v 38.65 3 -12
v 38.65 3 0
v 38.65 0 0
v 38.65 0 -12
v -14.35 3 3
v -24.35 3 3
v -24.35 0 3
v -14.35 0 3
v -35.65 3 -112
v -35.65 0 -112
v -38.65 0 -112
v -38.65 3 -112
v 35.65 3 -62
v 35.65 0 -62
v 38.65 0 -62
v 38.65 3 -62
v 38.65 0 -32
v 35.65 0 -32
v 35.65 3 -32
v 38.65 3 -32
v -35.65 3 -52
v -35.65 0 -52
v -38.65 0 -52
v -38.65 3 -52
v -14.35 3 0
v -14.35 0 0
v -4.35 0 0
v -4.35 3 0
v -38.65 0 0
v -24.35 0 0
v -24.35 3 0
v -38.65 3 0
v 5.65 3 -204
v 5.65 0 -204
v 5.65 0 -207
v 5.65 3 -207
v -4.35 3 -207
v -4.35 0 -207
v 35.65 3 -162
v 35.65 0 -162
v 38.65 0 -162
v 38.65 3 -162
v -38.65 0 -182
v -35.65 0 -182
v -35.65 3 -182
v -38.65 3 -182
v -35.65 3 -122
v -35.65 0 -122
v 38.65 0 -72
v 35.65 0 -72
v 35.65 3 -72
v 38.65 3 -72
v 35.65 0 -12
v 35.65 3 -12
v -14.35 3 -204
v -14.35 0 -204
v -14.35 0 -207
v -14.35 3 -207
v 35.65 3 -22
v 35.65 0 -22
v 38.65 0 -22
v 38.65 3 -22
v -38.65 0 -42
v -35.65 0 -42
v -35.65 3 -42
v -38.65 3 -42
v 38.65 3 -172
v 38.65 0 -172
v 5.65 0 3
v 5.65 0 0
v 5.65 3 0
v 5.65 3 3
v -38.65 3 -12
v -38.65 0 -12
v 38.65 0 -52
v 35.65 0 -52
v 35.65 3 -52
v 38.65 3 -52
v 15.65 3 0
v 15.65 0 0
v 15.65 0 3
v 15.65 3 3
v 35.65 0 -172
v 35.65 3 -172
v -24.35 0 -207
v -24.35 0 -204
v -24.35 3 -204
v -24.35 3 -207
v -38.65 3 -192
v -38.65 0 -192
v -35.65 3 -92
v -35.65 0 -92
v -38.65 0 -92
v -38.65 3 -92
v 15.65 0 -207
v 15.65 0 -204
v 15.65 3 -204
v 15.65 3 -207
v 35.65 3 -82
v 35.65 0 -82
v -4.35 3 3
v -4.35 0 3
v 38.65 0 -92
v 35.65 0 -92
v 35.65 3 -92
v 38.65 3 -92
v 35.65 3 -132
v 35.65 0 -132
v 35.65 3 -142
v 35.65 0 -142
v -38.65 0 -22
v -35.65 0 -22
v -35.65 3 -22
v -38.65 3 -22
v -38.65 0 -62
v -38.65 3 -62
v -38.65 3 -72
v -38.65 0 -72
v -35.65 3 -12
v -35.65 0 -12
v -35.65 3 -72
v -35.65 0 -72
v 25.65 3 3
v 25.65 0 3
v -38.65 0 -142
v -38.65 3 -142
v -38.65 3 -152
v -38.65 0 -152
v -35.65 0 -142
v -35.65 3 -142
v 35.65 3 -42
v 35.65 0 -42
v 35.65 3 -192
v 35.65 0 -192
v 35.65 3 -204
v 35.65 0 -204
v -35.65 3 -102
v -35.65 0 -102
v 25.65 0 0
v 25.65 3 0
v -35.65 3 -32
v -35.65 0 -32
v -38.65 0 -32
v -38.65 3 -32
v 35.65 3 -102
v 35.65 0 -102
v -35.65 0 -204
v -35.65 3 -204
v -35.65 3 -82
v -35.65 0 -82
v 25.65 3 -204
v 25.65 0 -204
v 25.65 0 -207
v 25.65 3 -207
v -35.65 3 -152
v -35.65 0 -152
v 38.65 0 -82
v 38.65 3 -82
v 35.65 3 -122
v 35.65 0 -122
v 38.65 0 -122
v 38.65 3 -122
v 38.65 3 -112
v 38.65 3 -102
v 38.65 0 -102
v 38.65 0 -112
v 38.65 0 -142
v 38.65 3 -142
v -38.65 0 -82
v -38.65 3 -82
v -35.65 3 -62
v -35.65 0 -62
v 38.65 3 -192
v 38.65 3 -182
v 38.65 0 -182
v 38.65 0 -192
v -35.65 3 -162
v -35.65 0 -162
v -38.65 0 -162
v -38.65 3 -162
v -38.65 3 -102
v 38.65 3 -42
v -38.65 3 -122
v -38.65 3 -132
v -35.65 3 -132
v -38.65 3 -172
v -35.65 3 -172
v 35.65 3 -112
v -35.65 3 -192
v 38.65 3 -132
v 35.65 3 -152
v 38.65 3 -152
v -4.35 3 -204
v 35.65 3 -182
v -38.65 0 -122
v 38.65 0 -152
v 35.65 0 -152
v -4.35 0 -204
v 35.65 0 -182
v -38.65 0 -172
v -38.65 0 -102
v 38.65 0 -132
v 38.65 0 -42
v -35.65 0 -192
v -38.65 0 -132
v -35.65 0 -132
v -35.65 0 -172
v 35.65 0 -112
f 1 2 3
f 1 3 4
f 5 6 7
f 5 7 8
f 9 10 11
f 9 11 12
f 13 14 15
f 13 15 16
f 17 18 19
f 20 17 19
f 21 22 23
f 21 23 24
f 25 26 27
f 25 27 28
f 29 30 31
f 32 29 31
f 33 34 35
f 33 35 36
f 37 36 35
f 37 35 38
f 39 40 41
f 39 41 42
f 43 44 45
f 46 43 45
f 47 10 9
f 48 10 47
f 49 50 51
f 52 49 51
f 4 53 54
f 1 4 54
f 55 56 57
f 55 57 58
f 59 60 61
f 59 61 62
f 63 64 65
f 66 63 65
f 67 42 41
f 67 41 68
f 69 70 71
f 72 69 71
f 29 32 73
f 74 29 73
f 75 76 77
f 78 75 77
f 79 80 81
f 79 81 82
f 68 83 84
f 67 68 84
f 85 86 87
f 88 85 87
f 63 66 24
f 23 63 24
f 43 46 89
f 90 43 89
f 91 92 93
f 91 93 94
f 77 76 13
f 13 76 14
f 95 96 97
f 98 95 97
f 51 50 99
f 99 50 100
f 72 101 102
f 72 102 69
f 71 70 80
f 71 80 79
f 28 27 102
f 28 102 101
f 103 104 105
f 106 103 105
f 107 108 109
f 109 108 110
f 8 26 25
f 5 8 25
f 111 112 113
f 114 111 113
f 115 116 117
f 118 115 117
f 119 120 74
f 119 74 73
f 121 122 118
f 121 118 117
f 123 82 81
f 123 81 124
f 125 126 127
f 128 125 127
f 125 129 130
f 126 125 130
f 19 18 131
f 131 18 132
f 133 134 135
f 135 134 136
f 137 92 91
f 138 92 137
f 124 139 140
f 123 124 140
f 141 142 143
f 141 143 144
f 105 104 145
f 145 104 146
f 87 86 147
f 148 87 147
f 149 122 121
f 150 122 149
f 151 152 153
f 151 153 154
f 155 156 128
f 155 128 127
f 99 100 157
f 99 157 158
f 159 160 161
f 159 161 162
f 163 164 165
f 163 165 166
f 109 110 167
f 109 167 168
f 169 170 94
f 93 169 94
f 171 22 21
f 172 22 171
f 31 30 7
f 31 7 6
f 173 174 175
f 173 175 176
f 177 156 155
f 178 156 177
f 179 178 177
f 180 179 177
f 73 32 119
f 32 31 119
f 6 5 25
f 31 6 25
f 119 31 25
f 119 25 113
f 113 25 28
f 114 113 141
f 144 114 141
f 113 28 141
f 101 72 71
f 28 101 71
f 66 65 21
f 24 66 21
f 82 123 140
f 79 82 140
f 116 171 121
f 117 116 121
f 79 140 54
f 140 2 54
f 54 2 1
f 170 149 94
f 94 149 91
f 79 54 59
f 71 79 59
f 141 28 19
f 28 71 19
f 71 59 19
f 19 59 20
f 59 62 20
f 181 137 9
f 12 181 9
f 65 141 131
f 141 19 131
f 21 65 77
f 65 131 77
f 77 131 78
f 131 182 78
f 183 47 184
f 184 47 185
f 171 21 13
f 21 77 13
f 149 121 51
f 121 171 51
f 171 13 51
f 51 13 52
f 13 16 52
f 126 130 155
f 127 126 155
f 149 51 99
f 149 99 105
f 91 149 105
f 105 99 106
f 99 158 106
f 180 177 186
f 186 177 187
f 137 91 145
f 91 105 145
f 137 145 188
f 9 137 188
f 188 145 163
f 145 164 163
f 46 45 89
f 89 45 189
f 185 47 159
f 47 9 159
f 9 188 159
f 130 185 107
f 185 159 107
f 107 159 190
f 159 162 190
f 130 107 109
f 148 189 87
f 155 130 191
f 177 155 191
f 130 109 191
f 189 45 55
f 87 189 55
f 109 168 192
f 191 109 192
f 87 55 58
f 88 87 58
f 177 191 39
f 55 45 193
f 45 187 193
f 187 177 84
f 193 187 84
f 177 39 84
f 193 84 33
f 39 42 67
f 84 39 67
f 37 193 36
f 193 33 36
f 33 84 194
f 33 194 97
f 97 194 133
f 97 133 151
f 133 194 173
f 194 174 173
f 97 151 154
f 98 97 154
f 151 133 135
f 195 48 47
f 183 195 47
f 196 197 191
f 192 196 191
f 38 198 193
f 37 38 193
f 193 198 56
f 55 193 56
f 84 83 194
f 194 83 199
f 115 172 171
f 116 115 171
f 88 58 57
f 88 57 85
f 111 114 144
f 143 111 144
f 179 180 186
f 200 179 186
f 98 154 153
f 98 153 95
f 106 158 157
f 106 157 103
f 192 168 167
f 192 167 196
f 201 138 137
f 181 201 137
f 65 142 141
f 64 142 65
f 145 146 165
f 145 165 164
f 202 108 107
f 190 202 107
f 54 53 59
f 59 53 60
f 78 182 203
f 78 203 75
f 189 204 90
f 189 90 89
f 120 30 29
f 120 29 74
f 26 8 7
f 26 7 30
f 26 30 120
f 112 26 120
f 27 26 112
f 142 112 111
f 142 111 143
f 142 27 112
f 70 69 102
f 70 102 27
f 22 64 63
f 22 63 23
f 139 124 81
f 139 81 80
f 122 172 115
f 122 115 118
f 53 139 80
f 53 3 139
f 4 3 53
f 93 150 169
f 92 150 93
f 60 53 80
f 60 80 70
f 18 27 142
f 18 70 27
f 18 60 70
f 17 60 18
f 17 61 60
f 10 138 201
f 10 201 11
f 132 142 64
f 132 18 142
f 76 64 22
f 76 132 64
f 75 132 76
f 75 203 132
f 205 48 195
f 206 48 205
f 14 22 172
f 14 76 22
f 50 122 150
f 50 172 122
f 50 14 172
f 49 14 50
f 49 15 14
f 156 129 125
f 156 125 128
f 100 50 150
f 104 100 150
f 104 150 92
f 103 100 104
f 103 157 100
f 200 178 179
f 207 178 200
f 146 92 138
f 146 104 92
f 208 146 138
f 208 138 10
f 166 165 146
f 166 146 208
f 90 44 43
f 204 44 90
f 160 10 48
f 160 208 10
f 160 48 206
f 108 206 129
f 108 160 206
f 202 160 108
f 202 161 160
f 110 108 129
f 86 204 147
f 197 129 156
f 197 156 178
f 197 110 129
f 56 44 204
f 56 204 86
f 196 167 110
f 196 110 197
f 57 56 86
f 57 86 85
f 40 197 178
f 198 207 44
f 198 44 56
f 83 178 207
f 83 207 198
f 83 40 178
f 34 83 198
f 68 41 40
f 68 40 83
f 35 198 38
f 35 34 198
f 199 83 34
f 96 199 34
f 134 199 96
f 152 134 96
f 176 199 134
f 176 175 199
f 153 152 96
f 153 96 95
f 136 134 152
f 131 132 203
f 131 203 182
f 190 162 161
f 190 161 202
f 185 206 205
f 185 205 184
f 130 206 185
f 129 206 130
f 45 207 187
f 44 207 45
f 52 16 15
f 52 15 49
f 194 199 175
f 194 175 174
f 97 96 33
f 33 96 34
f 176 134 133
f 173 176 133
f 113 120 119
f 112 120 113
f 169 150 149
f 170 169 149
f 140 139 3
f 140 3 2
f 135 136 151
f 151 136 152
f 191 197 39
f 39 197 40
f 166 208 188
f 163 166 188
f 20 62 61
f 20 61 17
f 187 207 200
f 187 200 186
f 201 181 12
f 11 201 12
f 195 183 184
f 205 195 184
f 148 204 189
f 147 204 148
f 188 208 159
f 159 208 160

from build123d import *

# Parameters (mm, degrees)
SKETCH1_W           = 35.65
SKETCH1_H           = 204
BOSS_EXTRUDE1_DEPTH = 3
SKETCH2_W           = 12
SKETCH2_H           = 3
SKETCH2_W_2         = 10
BOSS_EXTRUDE2_DEPTH = 3
ESQUISSE1_W         = 10
ESQUISSE1_H         = 3
BOSS_EXTRU_1_DEPTH  = 3
ESQUISSE2_W         = 10
ESQUISSE2_H         = 3
BOSS_EXTRU_2_DEPTH  = 3


with BuildPart() as part:
    # Sketch1 → Boss-Extrude1 (new body)
    with BuildSketch(Plane(origin=(0, 0, 0), x_dir=(1, 0, 0), z_dir=(0, 1, 0))):
        with Locations((17.825, 102)):
            Rectangle(SKETCH1_W, SKETCH1_H)
    boss_extrude1 = extrude(amount=BOSS_EXTRUDE1_DEPTH)

    # Sketch2 → Boss-Extrude2 (add)
    with BuildSketch(Plane(origin=(35.65, 0, 0), x_dir=(0, 0, -1), z_dir=(1, 0, 0))):
        with Locations((6, 1.5)):
            Rectangle(SKETCH2_W, SKETCH2_H)
        with Locations((27, 1.5)):
            Rectangle(SKETCH2_W_2, SKETCH2_H)
        with Locations((47, 1.5)):
            Rectangle(SKETCH2_W_2, SKETCH2_H)
        with Locations((67, 1.5)):
            Rectangle(SKETCH2_W_2, SKETCH2_H)
        with Locations((87, 1.5)):
            Rectangle(SKETCH2_W_2, SKETCH2_H)
        with Locations((107, 1.5)):
            Rectangle(SKETCH2_W_2, SKETCH2_H)
        with Locations((127, 1.5)):
            Rectangle(SKETCH2_W_2, SKETCH2_H)
        with Locations((147, 1.5)):
            Rectangle(SKETCH2_W_2, SKETCH2_H)
        with Locations((167, 1.5)):
            Rectangle(SKETCH2_W_2, SKETCH2_H)
        with Locations((187, 1.5)):
            Rectangle(SKETCH2_W_2, SKETCH2_H)
    boss_extrude2 = extrude(amount=BOSS_EXTRUDE2_DEPTH)

    # Mirror1: Boss-Extrude1, Boss-Extrude2 across plane
    add(boss_extrude1.mirror(Plane(origin=(0, 0, 0), x_dir=(0, 0, 1), z_dir=(1, 0, 0))))
    add(boss_extrude2.mirror(Plane(origin=(0, 0, 0), x_dir=(0, 0, 1), z_dir=(1, 0, 0))))

    # Esquisse1 → Boss.-Extru.1 (add)
    with BuildSketch(Plane(origin=(0, 0, -204), x_dir=(-1, 0, 0), z_dir=(0, 0, -1))):
        with Locations((-20.65, 1.5)):
            Rectangle(ESQUISSE1_W, ESQUISSE1_H)
        with Locations((-0.65, 1.5)):
            Rectangle(ESQUISSE1_W, ESQUISSE1_H)
        with Locations((19.35, 1.5)):
            Rectangle(ESQUISSE1_W, ESQUISSE1_H)
    extrude(amount=BOSS_EXTRU_1_DEPTH)

    # Esquisse2 → Boss.-Extru.2 (add)
    with BuildSketch(Plane.XY):
        with Locations((-19.35, 1.5)):
            Rectangle(ESQUISSE2_W, ESQUISSE2_H)
        with Locations((0.65, 1.5)):
            Rectangle(ESQUISSE2_W, ESQUISSE2_H)
        with Locations((20.65, 1.5)):
            Rectangle(ESQUISSE2_W, ESQUISSE2_H)
    extrude(amount=BOSS_EXTRU_2_DEPTH)


solid = part.part
